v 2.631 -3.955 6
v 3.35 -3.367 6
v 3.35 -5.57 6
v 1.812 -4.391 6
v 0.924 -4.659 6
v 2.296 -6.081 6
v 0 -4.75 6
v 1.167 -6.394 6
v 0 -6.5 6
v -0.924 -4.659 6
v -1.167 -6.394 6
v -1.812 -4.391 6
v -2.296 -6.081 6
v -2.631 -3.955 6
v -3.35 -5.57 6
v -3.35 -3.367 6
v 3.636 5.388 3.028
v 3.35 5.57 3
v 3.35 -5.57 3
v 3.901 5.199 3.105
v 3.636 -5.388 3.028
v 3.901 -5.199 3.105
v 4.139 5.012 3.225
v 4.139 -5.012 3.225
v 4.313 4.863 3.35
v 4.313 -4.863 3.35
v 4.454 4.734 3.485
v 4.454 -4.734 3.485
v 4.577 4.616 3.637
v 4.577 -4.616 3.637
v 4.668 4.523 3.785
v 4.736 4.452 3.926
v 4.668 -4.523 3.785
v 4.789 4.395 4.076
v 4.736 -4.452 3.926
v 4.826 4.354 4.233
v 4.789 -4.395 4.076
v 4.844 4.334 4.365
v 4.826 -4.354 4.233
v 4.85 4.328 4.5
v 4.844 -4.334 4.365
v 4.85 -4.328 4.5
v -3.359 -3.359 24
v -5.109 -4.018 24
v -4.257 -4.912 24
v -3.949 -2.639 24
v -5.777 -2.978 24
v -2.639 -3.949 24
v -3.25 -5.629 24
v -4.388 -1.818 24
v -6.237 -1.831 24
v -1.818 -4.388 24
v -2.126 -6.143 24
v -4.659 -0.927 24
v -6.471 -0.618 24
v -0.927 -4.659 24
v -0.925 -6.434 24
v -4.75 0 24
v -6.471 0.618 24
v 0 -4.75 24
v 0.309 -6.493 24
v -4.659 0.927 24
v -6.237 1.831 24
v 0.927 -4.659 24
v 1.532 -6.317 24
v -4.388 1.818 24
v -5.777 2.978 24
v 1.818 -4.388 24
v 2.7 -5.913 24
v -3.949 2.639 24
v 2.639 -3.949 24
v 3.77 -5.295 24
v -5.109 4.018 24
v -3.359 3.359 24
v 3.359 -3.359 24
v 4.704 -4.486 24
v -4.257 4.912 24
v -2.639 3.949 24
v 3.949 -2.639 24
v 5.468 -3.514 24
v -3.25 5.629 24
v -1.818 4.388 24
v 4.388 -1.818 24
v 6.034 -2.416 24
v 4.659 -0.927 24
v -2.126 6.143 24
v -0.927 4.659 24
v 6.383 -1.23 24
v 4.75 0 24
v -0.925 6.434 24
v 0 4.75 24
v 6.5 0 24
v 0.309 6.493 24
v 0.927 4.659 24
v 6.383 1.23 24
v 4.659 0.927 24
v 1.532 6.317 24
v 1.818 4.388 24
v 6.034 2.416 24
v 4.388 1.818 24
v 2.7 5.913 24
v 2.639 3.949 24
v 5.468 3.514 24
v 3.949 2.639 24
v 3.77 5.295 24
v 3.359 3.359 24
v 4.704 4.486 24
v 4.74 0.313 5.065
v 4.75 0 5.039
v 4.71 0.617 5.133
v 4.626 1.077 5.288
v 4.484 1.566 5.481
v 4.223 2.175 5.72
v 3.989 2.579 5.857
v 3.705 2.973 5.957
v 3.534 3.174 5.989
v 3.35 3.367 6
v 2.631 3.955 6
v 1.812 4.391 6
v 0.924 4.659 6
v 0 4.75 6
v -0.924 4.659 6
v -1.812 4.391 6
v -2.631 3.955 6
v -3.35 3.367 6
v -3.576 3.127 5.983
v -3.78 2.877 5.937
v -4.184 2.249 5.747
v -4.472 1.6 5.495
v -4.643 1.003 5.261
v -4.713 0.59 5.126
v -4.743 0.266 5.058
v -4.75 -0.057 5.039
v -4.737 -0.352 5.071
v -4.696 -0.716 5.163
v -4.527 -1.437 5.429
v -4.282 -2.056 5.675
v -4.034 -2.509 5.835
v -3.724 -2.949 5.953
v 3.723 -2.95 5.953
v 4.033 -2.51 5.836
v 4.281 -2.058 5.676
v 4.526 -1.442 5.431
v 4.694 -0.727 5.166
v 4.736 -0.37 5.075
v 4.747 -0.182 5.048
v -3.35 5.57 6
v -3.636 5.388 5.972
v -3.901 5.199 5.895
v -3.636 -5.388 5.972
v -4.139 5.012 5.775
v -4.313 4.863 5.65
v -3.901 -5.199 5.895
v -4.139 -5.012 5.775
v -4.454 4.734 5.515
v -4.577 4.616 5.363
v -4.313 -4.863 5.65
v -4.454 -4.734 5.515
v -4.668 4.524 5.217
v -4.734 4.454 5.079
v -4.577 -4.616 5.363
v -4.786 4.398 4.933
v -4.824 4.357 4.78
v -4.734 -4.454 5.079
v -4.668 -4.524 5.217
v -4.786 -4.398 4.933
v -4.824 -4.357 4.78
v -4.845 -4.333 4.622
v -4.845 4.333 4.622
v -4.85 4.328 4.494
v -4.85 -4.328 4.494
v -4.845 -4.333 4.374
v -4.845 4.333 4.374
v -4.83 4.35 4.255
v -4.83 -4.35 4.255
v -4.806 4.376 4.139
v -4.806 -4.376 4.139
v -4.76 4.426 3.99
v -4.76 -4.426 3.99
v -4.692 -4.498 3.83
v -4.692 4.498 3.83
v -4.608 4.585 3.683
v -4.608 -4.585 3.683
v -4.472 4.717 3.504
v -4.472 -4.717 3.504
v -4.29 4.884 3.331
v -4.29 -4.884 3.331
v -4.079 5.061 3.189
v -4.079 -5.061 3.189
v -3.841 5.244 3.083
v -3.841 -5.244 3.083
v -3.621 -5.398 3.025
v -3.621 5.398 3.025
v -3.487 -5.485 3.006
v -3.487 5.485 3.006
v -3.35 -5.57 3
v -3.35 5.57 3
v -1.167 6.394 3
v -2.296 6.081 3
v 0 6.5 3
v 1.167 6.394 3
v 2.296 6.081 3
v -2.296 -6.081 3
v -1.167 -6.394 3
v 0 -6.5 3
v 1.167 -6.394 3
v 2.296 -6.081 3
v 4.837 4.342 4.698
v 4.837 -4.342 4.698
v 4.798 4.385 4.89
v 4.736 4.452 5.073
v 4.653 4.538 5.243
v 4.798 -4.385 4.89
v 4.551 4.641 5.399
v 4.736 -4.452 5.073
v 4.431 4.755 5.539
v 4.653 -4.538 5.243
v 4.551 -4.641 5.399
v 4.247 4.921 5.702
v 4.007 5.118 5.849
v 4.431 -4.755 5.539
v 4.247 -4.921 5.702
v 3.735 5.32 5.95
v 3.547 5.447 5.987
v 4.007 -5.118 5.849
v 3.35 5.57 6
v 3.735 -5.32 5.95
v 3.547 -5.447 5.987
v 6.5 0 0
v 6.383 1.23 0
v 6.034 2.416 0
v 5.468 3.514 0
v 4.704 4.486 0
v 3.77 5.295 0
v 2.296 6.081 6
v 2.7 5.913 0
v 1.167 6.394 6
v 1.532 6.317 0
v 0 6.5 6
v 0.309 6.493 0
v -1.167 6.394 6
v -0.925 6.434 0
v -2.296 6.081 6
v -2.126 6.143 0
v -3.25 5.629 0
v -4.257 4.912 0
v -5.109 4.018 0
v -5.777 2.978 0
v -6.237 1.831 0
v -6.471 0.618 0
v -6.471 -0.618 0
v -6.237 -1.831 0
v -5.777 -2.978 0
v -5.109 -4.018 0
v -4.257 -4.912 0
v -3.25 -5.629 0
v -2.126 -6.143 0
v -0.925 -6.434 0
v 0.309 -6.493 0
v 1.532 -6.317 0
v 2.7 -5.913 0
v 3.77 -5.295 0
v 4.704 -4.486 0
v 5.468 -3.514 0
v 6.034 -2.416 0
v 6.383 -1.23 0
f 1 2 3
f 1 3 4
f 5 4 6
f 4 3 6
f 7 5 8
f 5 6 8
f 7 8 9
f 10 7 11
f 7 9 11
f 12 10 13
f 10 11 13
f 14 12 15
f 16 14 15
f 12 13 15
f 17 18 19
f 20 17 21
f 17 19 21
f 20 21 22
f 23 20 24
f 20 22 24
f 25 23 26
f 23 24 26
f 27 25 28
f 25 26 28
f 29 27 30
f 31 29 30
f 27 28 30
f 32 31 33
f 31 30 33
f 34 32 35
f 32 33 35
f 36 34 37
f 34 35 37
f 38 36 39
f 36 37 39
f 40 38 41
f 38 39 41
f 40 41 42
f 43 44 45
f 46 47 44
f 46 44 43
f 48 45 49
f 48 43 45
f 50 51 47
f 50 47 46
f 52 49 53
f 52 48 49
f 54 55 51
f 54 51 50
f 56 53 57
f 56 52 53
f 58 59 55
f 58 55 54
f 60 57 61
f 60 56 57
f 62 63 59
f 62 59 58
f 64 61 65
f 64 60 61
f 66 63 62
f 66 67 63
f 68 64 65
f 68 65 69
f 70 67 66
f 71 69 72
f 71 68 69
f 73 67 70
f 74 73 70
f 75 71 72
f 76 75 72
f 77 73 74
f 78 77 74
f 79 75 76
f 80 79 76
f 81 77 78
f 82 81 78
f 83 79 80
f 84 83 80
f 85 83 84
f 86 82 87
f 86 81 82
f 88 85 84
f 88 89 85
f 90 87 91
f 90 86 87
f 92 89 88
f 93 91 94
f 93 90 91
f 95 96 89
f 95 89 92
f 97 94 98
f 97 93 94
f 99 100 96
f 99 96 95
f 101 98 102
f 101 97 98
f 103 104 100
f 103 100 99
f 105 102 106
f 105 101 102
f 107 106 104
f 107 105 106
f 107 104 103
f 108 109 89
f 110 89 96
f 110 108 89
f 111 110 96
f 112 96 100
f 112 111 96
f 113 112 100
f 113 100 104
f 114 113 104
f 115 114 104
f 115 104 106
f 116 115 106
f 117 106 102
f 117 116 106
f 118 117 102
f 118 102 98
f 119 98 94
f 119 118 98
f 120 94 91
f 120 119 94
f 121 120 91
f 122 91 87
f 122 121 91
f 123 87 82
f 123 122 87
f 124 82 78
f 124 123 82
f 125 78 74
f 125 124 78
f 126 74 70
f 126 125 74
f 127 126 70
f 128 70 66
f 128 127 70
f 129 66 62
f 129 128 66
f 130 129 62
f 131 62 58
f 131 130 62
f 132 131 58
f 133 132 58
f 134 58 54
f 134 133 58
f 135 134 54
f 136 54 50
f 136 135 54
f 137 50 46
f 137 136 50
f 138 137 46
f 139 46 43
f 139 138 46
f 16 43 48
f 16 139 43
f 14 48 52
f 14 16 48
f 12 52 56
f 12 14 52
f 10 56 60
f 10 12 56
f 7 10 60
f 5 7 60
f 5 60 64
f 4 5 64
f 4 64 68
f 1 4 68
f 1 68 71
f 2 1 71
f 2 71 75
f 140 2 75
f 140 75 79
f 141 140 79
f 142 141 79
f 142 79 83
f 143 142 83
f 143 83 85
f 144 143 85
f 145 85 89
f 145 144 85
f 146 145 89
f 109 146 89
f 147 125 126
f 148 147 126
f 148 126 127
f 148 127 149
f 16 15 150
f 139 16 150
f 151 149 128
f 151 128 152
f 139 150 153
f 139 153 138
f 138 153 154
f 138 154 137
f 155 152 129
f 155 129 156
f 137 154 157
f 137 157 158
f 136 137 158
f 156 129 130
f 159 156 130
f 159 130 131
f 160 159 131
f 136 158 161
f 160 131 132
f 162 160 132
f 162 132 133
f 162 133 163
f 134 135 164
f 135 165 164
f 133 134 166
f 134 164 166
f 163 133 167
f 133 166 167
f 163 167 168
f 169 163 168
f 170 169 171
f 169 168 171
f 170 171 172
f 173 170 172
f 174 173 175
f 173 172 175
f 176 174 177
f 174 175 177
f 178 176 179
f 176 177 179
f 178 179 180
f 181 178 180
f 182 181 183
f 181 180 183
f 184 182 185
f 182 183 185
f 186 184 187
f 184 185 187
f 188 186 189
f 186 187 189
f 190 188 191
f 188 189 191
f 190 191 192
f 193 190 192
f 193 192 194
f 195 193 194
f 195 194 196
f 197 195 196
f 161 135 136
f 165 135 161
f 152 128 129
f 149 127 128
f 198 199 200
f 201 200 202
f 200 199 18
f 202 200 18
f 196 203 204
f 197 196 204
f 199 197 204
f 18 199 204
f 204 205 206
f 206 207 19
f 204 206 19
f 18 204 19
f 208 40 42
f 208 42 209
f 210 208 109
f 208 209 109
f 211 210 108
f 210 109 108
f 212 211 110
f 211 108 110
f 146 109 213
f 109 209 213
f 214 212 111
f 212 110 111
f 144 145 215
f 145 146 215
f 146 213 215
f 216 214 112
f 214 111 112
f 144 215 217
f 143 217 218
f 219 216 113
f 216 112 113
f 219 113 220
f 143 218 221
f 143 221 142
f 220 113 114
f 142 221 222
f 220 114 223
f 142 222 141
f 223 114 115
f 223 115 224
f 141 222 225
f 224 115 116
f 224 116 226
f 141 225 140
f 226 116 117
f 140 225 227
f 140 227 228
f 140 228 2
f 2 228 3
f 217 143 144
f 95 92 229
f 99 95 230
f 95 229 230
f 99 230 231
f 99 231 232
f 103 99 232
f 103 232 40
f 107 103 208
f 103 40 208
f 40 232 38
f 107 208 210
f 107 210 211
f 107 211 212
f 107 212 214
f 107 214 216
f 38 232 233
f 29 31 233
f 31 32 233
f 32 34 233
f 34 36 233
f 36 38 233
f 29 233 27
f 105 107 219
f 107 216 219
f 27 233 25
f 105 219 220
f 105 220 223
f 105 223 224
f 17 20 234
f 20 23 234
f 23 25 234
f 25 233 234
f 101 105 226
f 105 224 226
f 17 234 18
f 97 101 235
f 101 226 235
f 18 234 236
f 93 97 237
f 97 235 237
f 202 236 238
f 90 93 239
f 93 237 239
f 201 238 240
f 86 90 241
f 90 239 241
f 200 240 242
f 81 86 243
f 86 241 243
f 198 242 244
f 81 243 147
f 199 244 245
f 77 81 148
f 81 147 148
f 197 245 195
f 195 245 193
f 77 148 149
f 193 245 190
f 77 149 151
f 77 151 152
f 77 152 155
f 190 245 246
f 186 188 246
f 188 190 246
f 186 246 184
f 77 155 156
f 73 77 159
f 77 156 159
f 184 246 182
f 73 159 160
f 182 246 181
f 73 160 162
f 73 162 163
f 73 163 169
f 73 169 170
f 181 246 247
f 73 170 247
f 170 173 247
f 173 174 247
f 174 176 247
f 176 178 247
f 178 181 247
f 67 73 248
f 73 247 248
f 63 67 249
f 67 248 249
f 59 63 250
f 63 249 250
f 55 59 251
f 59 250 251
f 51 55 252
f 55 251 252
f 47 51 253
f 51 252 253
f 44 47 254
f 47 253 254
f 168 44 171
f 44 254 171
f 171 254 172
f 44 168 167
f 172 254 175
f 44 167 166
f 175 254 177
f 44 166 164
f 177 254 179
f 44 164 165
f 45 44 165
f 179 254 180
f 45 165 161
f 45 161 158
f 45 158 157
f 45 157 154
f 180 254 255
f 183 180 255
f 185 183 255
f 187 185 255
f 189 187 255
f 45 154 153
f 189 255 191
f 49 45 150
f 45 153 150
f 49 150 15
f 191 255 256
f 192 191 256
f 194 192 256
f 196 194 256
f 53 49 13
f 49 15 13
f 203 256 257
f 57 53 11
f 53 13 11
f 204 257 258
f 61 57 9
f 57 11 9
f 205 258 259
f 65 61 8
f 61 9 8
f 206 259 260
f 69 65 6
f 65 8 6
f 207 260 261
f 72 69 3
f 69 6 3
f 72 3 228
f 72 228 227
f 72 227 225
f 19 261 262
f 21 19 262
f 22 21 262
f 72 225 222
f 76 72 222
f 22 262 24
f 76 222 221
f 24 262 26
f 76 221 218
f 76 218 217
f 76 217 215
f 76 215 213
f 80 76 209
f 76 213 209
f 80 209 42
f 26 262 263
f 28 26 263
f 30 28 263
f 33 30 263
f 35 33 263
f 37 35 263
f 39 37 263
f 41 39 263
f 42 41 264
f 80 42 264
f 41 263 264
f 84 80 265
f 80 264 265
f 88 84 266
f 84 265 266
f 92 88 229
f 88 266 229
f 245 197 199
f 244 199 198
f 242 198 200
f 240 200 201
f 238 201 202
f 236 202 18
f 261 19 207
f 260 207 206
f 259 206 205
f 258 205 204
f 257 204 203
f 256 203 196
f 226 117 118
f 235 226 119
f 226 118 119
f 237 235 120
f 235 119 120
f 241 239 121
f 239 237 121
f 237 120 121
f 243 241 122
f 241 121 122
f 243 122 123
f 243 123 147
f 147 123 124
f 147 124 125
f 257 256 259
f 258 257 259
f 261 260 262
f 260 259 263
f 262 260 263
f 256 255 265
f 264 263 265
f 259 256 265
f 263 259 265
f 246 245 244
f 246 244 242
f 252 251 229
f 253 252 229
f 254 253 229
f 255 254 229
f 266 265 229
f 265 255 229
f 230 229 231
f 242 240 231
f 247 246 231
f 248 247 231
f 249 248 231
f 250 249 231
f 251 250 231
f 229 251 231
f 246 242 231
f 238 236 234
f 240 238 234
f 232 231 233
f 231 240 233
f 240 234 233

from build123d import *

# Parameters (mm, degrees)
F0_R     = 6.5
F1_DEPTH = 4
F2_R     = 6.5
F2_R_2   = 4.75
F3_DEPTH = 20
F6_DEPTH = 25


with BuildPart() as f1:
    # F0 (on Top) → F1 (new body)
    with BuildSketch(Plane.XY):
        Circle(F0_R)
    extrude(amount=F1_DEPTH)

    # F2 (on face) → F3 (join)
    with BuildSketch(Plane.XY.offset(4)):
        Circle(F2_R)
        Circle(F2_R_2, mode=Mode.SUBTRACT)
    extrude(amount=F3_DEPTH)

    # F5 (on offset) → F6 (cut)
    with BuildSketch(Plane.XZ.offset(10)):
        with BuildLine():
            ThreePointArc((-1.85, 4.5), (-2.2893398282, 5.5606601718), (-3.35, 6))
            Line((-3.35, 6), (-3.35, 3))
            ThreePointArc((-3.35, 3), (-2.2893398282, 3.4393398282), (-1.85, 4.5))
        make_face()
        with BuildLine():
            Line((3.35, 6), (-3.35, 6))
            ThreePointArc((-3.35, 6), (-2.2893398282, 5.5606601718), (-1.85, 4.5))
            ThreePointArc((-1.85, 4.5), (-2.2893398282, 3.4393398282), (-3.35, 3))
            Line((-3.35, 3), (3.35, 3))
            ThreePointArc((3.35, 3), (1.85, 4.5), (3.35, 6))
        make_face()
        with BuildLine():
            Line((-3.35, 3), (-3.35, 6))
            ThreePointArc((-3.35, 6), (-4.85, 4.5), (-3.35, 3))
        make_face()
        with BuildLine():
            ThreePointArc((4.85, 4.5), (4.4106601718, 5.5606601718), (3.35, 6))
            Line((3.35, 6), (3.35, 3))
            ThreePointArc((3.35, 3), (4.4106601718, 3.4393398282), (4.85, 4.5))
        make_face()
        with BuildLine():
            Line((3.35, 3), (3.35, 6))
            ThreePointArc((3.35, 6), (1.85, 4.5), (3.35, 3))
        make_face()
    extrude(amount=-F6_DEPTH, mode=Mode.SUBTRACT)


solid = f1.part
